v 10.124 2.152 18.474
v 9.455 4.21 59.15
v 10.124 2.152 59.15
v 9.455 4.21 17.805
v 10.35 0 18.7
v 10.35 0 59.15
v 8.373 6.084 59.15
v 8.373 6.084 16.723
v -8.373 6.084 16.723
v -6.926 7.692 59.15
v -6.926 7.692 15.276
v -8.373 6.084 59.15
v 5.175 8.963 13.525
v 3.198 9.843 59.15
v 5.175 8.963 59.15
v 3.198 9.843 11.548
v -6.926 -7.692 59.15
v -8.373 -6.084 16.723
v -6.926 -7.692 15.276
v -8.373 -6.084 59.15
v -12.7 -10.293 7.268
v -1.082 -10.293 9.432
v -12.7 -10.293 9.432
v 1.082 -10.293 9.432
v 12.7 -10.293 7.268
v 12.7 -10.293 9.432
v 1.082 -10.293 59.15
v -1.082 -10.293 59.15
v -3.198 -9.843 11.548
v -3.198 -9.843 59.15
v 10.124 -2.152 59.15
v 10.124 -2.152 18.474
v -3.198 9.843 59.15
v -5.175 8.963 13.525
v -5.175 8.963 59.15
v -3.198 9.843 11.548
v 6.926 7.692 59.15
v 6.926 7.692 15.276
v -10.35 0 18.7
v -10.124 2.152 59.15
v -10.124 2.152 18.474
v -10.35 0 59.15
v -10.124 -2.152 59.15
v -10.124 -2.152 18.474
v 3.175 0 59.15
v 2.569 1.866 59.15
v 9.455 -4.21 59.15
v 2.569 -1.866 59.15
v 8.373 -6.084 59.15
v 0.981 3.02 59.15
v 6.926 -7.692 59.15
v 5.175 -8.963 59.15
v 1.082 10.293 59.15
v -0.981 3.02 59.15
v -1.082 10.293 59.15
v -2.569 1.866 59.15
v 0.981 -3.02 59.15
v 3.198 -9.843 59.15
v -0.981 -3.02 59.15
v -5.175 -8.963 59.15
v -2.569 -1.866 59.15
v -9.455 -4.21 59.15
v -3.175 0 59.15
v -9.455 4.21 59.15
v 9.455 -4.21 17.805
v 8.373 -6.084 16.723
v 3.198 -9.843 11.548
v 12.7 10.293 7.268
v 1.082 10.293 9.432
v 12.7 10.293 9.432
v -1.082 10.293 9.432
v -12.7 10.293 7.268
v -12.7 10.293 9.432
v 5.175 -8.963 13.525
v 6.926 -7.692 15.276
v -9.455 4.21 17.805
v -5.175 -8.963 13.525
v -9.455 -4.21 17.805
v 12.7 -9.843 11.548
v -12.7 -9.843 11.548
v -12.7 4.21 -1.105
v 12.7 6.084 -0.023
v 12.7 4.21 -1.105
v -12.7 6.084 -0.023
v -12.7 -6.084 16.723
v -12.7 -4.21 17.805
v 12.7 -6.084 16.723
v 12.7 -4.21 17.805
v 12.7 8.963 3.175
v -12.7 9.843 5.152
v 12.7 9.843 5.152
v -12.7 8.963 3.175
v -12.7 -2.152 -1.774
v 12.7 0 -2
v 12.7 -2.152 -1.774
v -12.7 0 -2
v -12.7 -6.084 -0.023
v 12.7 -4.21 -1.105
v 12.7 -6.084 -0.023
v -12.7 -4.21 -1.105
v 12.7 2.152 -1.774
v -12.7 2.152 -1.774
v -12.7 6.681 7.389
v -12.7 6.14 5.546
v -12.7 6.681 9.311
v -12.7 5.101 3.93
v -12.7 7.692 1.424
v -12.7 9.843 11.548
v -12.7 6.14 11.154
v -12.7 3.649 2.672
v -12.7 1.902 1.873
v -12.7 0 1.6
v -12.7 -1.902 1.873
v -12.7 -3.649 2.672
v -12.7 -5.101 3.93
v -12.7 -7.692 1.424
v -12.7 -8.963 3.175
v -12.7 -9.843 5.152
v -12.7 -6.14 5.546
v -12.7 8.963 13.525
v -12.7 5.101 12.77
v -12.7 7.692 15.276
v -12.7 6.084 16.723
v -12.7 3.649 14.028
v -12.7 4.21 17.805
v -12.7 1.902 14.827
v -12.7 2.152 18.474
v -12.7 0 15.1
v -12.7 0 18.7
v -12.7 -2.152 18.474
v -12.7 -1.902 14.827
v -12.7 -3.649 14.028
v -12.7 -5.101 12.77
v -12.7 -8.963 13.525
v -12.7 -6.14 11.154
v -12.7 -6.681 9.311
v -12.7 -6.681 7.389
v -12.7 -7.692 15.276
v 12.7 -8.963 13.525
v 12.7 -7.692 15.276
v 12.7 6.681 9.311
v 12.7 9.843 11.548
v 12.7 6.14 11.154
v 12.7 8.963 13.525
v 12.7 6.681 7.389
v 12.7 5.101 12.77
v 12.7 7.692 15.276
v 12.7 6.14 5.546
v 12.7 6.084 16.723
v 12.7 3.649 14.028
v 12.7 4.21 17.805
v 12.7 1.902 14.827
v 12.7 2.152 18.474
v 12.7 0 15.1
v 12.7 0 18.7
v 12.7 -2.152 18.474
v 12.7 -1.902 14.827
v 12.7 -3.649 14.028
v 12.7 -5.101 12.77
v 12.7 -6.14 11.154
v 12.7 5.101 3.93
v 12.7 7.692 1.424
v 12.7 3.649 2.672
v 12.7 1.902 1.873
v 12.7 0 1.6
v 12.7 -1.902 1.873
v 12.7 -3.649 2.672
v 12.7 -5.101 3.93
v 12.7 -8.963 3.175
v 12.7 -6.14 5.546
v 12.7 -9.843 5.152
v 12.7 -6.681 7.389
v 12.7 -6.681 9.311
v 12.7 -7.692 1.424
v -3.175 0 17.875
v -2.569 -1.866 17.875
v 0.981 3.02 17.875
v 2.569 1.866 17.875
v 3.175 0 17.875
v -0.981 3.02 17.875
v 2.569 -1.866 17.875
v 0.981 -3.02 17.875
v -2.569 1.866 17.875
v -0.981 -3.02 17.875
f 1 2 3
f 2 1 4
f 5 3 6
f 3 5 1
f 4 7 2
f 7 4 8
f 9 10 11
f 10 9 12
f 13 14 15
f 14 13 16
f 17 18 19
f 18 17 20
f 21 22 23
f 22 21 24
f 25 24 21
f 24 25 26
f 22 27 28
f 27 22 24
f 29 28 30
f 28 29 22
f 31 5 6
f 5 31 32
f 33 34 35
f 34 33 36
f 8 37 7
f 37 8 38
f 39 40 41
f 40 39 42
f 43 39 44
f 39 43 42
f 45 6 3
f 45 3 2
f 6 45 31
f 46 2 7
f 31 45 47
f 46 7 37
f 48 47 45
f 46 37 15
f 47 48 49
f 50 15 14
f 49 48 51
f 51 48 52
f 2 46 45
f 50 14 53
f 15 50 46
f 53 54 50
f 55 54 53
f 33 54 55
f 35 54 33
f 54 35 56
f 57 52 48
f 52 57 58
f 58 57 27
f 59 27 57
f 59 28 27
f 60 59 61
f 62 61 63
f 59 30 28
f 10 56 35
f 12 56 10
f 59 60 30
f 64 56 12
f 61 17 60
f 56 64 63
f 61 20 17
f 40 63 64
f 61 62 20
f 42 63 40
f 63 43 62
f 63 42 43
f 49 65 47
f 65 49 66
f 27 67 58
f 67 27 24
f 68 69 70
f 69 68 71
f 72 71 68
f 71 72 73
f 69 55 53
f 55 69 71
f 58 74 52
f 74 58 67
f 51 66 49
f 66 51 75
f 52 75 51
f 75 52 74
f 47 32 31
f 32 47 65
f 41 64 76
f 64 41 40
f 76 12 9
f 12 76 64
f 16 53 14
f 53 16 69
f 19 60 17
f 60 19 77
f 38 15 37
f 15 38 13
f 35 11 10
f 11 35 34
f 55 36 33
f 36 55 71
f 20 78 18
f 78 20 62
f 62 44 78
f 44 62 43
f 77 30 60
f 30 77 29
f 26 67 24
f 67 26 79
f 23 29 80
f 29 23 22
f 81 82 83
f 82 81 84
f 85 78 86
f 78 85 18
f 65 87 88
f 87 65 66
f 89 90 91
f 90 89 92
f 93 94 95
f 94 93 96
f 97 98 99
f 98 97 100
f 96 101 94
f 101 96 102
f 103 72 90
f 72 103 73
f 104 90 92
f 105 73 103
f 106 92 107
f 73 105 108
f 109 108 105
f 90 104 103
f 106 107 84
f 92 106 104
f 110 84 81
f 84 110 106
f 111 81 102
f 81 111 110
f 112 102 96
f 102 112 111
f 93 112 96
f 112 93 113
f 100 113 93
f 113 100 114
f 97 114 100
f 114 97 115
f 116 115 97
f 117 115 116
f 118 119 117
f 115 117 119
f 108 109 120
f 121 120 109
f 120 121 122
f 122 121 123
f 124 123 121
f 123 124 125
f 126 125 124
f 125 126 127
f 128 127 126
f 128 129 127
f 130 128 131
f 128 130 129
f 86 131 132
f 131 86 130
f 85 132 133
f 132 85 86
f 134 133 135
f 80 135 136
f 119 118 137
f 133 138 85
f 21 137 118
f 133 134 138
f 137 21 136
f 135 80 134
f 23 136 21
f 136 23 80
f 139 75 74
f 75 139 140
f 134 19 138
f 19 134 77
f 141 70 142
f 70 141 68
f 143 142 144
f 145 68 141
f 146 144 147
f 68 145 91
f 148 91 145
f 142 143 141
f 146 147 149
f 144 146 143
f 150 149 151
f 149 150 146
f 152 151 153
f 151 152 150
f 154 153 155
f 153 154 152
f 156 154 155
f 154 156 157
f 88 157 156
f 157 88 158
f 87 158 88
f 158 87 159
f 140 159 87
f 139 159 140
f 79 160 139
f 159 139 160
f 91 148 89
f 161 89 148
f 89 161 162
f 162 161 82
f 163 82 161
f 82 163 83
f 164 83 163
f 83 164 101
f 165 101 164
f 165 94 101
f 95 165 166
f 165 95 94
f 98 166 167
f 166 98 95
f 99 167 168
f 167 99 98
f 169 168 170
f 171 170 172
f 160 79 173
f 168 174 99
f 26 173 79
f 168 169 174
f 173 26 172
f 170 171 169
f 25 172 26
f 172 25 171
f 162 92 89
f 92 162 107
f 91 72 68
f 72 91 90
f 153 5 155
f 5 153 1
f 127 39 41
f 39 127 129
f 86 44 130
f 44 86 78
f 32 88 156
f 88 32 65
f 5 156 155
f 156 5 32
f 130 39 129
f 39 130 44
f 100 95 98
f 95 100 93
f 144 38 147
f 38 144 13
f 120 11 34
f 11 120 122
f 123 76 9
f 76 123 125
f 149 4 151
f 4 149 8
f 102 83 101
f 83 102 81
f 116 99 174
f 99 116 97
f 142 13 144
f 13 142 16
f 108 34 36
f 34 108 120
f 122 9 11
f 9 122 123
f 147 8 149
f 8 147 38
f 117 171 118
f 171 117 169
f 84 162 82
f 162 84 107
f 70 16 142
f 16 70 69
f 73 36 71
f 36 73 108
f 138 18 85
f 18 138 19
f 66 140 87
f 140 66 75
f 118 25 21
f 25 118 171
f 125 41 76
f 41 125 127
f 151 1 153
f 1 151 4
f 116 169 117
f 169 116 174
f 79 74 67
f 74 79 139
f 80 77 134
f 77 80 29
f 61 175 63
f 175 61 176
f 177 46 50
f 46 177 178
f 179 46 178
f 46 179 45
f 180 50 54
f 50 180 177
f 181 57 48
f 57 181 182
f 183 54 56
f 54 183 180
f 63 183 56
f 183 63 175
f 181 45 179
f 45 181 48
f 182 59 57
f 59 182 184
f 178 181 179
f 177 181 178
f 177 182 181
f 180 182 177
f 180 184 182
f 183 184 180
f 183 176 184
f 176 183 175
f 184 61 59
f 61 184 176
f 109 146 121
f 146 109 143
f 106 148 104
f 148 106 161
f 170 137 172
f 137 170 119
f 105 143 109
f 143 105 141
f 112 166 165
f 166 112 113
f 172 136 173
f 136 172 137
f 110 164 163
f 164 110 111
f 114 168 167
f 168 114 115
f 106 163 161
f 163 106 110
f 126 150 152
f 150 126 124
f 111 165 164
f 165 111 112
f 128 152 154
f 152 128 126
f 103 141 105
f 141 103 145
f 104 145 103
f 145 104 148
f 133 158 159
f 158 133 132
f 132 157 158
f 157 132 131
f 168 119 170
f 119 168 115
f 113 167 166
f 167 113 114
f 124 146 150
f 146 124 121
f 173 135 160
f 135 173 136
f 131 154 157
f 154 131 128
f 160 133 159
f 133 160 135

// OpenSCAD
inch = 25.4;
difference(){
    union() {
        translate([0, 0, inch/4+2])
        cylinder (h = 2*inch, r=inch/4+4);
        translate([-inch/2, 0, inch/4+2])
        rotate ([0,90,0]) cylinder (h = inch, r=inch/4+4);      
    }        
    union() {
        translate([0, 0, inch/4+2+inch/4+inch/8])
        cylinder (h = 2*inch+4, r=inch/8);
        translate([-inch/2-2, 0, inch/4+2])
        rotate ([0,90,0]) cylinder (h = inch+4, r=inch/4+.4);      
    }
}
